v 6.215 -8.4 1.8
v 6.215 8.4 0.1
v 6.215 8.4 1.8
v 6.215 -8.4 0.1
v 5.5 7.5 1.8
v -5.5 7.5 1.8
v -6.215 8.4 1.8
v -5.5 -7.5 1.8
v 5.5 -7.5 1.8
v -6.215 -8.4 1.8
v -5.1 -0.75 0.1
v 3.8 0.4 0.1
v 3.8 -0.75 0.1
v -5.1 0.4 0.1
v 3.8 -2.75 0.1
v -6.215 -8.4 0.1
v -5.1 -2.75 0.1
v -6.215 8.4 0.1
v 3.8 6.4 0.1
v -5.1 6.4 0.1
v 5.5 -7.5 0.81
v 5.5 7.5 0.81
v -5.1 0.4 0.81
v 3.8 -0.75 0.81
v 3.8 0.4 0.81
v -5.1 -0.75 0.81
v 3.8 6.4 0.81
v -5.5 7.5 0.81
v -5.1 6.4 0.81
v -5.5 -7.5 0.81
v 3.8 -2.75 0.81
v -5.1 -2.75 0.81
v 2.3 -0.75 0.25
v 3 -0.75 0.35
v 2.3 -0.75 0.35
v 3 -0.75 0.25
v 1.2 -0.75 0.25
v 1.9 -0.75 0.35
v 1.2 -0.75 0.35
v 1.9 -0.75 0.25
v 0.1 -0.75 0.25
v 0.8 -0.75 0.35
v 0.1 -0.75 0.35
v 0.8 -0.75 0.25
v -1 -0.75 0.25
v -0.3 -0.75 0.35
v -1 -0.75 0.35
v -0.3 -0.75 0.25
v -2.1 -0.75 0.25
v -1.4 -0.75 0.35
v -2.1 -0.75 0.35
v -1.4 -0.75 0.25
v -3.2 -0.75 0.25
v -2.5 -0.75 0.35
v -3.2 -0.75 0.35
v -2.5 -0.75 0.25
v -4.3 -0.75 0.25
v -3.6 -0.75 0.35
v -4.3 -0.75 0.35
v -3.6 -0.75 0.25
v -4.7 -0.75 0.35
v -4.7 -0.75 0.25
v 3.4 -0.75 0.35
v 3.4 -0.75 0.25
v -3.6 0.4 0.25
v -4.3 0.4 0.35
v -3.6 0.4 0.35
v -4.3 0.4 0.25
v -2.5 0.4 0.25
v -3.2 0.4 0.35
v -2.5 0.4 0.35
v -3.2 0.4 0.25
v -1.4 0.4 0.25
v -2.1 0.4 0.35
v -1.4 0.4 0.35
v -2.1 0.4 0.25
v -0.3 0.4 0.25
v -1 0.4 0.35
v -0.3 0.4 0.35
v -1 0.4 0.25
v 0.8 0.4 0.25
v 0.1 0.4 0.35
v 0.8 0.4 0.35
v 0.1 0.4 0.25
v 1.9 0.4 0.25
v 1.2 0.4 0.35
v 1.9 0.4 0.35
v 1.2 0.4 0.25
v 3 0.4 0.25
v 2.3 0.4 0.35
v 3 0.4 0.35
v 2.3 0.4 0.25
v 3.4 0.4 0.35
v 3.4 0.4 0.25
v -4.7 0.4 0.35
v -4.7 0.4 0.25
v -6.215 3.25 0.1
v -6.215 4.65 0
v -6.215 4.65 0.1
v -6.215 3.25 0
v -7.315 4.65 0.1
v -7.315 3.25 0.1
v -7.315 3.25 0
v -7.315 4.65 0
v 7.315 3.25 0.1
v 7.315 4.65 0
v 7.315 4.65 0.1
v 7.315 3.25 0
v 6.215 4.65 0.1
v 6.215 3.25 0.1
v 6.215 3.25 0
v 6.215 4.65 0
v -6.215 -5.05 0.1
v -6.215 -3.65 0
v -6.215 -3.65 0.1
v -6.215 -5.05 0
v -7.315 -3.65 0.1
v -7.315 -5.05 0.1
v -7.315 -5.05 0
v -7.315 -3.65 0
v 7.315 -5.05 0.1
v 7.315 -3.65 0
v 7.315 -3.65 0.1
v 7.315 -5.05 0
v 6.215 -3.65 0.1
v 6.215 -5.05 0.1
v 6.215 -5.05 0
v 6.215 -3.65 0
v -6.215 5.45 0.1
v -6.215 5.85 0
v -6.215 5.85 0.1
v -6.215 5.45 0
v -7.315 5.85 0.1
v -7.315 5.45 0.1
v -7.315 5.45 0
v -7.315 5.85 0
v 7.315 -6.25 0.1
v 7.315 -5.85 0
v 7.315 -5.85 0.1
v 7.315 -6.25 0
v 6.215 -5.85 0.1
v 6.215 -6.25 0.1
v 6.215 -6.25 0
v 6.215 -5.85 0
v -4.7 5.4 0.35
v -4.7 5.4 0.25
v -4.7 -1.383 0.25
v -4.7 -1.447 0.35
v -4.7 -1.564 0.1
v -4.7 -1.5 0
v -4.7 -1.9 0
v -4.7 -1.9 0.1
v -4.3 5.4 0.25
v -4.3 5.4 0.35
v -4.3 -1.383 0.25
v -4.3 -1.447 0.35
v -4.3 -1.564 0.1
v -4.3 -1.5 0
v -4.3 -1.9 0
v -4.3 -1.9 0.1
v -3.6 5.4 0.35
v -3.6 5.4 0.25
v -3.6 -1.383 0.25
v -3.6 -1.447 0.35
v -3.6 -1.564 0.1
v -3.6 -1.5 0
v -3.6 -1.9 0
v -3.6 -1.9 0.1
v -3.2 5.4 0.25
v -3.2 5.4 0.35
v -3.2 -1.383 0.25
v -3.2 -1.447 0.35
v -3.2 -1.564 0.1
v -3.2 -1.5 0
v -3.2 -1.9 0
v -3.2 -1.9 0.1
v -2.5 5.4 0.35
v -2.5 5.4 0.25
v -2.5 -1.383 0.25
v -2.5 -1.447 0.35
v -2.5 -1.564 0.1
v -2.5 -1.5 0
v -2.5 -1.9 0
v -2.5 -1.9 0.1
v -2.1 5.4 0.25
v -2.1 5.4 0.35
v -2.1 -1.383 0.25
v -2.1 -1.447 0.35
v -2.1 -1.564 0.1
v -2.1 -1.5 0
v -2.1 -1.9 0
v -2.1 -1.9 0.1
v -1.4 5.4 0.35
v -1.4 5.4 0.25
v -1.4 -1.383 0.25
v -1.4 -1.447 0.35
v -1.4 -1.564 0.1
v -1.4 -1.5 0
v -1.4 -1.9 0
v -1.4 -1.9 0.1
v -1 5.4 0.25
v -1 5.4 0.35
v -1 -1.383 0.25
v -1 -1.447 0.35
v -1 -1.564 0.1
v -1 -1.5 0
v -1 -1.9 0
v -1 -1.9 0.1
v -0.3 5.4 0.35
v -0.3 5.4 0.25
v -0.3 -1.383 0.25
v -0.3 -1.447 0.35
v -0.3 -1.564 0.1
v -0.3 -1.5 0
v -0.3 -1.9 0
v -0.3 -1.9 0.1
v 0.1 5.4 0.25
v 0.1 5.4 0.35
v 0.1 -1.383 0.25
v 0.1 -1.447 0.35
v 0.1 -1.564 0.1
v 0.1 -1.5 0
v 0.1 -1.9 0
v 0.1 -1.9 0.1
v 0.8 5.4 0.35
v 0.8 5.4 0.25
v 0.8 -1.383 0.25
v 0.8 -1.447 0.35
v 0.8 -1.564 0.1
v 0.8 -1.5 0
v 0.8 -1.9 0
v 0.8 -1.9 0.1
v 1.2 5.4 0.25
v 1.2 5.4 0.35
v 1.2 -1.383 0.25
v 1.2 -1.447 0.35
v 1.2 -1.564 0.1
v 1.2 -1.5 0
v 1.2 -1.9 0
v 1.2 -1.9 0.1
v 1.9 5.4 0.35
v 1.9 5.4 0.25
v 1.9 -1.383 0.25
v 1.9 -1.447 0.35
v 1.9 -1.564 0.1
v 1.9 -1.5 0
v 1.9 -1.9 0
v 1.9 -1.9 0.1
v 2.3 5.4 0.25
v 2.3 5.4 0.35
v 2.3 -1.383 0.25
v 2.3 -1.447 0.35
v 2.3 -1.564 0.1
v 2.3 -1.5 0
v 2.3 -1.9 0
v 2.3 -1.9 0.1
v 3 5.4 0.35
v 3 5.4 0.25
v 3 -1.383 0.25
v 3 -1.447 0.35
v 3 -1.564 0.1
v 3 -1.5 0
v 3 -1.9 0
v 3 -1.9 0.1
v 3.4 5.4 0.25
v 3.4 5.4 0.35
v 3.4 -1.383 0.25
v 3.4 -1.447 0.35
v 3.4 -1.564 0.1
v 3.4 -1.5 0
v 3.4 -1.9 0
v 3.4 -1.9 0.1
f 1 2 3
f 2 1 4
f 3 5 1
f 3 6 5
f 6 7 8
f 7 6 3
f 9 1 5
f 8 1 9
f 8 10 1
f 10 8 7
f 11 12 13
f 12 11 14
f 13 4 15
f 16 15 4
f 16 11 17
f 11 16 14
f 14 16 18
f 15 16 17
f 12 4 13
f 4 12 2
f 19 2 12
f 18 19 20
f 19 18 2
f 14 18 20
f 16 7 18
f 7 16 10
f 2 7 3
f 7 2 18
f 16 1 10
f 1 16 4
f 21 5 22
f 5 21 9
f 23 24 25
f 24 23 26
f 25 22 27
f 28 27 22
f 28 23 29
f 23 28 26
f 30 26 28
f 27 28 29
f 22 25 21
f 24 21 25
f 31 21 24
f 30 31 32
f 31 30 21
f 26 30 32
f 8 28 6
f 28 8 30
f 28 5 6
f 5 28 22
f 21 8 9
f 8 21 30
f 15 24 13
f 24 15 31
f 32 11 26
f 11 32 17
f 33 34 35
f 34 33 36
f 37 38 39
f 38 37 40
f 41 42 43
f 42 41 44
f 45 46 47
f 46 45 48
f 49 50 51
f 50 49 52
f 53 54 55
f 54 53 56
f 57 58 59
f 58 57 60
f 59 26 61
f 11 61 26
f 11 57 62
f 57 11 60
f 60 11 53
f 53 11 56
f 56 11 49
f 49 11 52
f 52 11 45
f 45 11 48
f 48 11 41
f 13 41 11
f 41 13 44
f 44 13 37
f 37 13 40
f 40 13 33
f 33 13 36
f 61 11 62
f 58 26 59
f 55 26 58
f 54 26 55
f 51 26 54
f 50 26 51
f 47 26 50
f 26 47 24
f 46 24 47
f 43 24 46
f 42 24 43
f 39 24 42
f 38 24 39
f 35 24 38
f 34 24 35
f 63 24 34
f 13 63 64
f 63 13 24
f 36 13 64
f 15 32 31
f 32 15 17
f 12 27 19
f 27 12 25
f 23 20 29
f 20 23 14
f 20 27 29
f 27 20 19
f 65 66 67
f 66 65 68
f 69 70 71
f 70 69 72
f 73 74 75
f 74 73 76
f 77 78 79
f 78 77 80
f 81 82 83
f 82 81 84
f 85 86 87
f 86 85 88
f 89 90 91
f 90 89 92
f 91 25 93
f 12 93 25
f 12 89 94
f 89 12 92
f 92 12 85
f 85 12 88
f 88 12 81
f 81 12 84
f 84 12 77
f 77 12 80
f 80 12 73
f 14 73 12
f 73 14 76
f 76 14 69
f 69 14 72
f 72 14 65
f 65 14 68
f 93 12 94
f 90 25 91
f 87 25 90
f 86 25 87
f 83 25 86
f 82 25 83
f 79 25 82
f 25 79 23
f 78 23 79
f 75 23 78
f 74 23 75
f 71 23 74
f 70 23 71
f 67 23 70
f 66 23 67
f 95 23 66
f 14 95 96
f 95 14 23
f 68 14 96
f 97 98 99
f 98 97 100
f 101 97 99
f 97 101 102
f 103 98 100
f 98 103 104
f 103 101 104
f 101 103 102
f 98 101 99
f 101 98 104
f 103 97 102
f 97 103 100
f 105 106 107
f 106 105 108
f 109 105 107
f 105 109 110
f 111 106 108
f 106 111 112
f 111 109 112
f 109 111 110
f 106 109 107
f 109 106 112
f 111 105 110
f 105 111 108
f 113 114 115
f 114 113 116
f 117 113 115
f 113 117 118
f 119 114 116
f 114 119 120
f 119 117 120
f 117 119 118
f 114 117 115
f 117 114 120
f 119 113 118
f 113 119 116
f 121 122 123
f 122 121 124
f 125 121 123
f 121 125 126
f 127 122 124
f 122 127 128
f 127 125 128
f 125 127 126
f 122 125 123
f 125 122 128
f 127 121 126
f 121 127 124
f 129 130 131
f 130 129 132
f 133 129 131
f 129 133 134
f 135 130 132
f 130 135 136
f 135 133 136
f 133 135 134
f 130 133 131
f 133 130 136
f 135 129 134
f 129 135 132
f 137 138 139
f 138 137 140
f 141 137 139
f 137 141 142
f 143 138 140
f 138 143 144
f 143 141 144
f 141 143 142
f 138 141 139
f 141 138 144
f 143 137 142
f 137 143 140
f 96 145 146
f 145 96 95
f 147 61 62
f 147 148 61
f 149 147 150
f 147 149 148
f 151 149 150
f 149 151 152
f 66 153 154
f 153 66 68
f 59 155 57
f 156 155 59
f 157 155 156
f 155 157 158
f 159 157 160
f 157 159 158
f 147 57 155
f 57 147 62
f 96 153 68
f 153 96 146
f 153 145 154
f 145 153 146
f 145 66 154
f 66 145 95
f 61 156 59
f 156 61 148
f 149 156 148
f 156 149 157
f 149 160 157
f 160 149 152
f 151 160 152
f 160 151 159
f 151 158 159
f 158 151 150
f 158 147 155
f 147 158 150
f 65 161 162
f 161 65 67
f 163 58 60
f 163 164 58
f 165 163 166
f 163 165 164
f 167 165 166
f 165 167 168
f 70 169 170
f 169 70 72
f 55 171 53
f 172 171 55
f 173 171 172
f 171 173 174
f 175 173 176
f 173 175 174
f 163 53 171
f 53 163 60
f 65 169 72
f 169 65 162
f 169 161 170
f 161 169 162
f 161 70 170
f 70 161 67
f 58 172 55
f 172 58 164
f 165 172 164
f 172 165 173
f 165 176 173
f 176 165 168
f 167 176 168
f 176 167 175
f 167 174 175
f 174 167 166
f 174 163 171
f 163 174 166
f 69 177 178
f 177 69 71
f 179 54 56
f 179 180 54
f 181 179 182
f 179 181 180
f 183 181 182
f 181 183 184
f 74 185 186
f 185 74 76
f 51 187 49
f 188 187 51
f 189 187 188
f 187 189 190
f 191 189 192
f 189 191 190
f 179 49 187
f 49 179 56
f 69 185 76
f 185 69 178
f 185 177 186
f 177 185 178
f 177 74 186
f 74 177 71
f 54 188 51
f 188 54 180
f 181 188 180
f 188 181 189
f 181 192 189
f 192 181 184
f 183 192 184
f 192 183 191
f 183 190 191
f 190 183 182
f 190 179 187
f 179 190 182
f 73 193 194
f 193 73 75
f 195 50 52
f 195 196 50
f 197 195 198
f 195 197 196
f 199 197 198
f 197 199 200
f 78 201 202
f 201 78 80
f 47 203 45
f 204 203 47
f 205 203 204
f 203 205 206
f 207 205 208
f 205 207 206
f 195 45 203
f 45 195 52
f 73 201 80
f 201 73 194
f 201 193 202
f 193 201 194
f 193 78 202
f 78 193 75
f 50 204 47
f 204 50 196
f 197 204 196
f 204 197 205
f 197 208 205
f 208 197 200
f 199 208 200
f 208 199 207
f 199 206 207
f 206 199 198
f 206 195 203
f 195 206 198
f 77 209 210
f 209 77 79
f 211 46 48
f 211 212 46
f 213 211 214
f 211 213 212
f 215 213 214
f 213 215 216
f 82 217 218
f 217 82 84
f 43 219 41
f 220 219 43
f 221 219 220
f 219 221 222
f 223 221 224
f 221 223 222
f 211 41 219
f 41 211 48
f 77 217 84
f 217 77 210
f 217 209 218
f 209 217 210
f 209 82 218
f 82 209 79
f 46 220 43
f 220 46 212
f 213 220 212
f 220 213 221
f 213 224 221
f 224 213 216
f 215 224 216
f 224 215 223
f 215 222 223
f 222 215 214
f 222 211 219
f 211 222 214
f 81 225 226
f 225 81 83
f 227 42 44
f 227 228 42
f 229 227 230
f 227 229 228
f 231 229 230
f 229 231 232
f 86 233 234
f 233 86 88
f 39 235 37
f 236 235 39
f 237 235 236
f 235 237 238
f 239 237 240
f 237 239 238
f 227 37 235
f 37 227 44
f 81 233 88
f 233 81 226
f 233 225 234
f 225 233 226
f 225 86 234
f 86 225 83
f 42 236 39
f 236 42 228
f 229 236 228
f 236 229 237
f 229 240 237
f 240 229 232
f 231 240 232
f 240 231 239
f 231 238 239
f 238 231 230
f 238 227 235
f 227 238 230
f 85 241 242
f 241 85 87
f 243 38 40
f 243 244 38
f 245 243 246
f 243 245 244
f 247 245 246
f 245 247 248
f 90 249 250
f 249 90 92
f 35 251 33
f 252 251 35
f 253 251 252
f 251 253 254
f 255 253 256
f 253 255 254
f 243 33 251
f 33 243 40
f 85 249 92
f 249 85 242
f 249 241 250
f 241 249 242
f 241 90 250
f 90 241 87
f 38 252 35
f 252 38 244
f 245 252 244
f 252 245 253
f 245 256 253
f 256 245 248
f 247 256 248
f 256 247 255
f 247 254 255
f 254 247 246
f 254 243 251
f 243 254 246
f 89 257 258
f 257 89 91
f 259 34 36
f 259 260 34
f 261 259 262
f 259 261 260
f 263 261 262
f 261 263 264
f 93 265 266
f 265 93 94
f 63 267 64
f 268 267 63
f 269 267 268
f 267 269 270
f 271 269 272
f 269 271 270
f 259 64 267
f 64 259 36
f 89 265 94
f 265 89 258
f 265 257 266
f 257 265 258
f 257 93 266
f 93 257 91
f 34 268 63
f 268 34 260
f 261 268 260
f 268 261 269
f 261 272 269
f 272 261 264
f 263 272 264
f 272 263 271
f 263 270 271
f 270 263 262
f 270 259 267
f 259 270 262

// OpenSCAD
dim=[12.43,16.8,1.7]; // base dimensions
above=0.1; // base above the PCB clearance
color_base=[0.2,0.1,0.1];

// 2 small pins (small) GND
dim_pin_small=[1.1,0.4,0.1];
pos_pin_small=[
  [-dim[0]/2-dim_pin_small[0]/2,dim[1]/2-2.75,0.05],
  [ dim[0]/2+dim_pin_small[0]/2,dim[1]/2-14.45,0.05]
];

// mounting 4 side pins (big)
dim_pin_big=[1.1,1.4,0.1];
pos_pin_big=[
  [-dim[0]/2-dim_pin_big[0]/2,dim[1]/2-4.45,0.05],
  [ dim[0]/2+dim_pin_big[0]/2,dim[1]/2-4.45,0.05],
  [-dim[0]/2-dim_pin_big[0]/2,dim[1]/2-12.75,0.05],
  [ dim[0]/2+dim_pin_big[0]/2,dim[1]/2-12.75,0.05]
];

// Pins for signal solder contacts
pin_th = 0.1; // Thickness
pin_W = 0.4;  // Pin width
pin_L = 7.3;  // Total Length
pin_H = 0.3+pin_th/2; // Pin height (from bottom to top)
pin_l = 0.4;  // Length of the bottom part
pin_a = 115;  // Bending angle

pin_pitch = 1.1;
pin_count = 8;

color_pin="white";

// Bent pin
// _L - whole pin length
// _l - length of bottom part
// _H - whole pin height
// _th - pin thickness
// _a - bending angle
// _W - pin width
module pin(_L,_l,_H,_th,_a,_W)
{
    // Internal variables
    _d1 = _th*sin(_a) / (1-cos(_a));
    _d2 = (_th-_H)*cos(_a) / sin(_a);

    rotate([90,0,90])
    // Extrude the following polygon
    linear_extrude(height = _W, center = true, convexity = 10, twist = 0)
        polygon([[0,0],
                 [_l,0],
                 [_l+_d2,_H-_th],
                 [_L,_H-_th],
                 [_L,_H],
                 [_l+_d2-_d1,_H],
                 [_l-_d1,_th],
                 [0,_th]]);
}

// Array of pins
// _cnt - number of pins
// _distance - distance between pin centres
module pins_array(_cnt, _distance)
{
    if (_cnt>0)
    color(color_pin)
    {
        for (_i = [0:_cnt-1])
        {
            translate([_distance*_i,0,0])
                pin(pin_L,pin_l,pin_H,pin_th,pin_a,pin_W);
        }
    }
}


module SCHD3A100()
{
  translate([0,0,dim[2]/2+above])
    difference()
    {
      color(color_base)
        cube(dim, center=true);
      // cut SD card area
      translate([0,0,dim[2]/2-1/2+0.01])
        color(color_base)
          cube([11,15,1],center=true);
      // cut pin soldering area
      translate([-1.3/2,dim[1]/2-10.15,0])
        color(color_base)
          cube([8.9,2,4],center=true);
      // cut pin spring area
      translate([-1.3/2,dim[1]/2-5,0])
        color(color_base)
          cube([8.9,6,4],center=true);
    }
    
    for(i=[0:len(pos_pin_big)-1])
    translate(pos_pin_big[i])
      color(color_pin)
        cube(dim_pin_big,center=true);

    for(i=[0:len(pos_pin_small)-1])
    translate(pos_pin_small[i])
      color(color_pin)
        cube(dim_pin_small,center=true);

    translate([3.2-(pin_count-1)*pin_pitch,-1.9,0])
      pins_array(pin_count, pin_pitch);
}

SCHD3A100();
